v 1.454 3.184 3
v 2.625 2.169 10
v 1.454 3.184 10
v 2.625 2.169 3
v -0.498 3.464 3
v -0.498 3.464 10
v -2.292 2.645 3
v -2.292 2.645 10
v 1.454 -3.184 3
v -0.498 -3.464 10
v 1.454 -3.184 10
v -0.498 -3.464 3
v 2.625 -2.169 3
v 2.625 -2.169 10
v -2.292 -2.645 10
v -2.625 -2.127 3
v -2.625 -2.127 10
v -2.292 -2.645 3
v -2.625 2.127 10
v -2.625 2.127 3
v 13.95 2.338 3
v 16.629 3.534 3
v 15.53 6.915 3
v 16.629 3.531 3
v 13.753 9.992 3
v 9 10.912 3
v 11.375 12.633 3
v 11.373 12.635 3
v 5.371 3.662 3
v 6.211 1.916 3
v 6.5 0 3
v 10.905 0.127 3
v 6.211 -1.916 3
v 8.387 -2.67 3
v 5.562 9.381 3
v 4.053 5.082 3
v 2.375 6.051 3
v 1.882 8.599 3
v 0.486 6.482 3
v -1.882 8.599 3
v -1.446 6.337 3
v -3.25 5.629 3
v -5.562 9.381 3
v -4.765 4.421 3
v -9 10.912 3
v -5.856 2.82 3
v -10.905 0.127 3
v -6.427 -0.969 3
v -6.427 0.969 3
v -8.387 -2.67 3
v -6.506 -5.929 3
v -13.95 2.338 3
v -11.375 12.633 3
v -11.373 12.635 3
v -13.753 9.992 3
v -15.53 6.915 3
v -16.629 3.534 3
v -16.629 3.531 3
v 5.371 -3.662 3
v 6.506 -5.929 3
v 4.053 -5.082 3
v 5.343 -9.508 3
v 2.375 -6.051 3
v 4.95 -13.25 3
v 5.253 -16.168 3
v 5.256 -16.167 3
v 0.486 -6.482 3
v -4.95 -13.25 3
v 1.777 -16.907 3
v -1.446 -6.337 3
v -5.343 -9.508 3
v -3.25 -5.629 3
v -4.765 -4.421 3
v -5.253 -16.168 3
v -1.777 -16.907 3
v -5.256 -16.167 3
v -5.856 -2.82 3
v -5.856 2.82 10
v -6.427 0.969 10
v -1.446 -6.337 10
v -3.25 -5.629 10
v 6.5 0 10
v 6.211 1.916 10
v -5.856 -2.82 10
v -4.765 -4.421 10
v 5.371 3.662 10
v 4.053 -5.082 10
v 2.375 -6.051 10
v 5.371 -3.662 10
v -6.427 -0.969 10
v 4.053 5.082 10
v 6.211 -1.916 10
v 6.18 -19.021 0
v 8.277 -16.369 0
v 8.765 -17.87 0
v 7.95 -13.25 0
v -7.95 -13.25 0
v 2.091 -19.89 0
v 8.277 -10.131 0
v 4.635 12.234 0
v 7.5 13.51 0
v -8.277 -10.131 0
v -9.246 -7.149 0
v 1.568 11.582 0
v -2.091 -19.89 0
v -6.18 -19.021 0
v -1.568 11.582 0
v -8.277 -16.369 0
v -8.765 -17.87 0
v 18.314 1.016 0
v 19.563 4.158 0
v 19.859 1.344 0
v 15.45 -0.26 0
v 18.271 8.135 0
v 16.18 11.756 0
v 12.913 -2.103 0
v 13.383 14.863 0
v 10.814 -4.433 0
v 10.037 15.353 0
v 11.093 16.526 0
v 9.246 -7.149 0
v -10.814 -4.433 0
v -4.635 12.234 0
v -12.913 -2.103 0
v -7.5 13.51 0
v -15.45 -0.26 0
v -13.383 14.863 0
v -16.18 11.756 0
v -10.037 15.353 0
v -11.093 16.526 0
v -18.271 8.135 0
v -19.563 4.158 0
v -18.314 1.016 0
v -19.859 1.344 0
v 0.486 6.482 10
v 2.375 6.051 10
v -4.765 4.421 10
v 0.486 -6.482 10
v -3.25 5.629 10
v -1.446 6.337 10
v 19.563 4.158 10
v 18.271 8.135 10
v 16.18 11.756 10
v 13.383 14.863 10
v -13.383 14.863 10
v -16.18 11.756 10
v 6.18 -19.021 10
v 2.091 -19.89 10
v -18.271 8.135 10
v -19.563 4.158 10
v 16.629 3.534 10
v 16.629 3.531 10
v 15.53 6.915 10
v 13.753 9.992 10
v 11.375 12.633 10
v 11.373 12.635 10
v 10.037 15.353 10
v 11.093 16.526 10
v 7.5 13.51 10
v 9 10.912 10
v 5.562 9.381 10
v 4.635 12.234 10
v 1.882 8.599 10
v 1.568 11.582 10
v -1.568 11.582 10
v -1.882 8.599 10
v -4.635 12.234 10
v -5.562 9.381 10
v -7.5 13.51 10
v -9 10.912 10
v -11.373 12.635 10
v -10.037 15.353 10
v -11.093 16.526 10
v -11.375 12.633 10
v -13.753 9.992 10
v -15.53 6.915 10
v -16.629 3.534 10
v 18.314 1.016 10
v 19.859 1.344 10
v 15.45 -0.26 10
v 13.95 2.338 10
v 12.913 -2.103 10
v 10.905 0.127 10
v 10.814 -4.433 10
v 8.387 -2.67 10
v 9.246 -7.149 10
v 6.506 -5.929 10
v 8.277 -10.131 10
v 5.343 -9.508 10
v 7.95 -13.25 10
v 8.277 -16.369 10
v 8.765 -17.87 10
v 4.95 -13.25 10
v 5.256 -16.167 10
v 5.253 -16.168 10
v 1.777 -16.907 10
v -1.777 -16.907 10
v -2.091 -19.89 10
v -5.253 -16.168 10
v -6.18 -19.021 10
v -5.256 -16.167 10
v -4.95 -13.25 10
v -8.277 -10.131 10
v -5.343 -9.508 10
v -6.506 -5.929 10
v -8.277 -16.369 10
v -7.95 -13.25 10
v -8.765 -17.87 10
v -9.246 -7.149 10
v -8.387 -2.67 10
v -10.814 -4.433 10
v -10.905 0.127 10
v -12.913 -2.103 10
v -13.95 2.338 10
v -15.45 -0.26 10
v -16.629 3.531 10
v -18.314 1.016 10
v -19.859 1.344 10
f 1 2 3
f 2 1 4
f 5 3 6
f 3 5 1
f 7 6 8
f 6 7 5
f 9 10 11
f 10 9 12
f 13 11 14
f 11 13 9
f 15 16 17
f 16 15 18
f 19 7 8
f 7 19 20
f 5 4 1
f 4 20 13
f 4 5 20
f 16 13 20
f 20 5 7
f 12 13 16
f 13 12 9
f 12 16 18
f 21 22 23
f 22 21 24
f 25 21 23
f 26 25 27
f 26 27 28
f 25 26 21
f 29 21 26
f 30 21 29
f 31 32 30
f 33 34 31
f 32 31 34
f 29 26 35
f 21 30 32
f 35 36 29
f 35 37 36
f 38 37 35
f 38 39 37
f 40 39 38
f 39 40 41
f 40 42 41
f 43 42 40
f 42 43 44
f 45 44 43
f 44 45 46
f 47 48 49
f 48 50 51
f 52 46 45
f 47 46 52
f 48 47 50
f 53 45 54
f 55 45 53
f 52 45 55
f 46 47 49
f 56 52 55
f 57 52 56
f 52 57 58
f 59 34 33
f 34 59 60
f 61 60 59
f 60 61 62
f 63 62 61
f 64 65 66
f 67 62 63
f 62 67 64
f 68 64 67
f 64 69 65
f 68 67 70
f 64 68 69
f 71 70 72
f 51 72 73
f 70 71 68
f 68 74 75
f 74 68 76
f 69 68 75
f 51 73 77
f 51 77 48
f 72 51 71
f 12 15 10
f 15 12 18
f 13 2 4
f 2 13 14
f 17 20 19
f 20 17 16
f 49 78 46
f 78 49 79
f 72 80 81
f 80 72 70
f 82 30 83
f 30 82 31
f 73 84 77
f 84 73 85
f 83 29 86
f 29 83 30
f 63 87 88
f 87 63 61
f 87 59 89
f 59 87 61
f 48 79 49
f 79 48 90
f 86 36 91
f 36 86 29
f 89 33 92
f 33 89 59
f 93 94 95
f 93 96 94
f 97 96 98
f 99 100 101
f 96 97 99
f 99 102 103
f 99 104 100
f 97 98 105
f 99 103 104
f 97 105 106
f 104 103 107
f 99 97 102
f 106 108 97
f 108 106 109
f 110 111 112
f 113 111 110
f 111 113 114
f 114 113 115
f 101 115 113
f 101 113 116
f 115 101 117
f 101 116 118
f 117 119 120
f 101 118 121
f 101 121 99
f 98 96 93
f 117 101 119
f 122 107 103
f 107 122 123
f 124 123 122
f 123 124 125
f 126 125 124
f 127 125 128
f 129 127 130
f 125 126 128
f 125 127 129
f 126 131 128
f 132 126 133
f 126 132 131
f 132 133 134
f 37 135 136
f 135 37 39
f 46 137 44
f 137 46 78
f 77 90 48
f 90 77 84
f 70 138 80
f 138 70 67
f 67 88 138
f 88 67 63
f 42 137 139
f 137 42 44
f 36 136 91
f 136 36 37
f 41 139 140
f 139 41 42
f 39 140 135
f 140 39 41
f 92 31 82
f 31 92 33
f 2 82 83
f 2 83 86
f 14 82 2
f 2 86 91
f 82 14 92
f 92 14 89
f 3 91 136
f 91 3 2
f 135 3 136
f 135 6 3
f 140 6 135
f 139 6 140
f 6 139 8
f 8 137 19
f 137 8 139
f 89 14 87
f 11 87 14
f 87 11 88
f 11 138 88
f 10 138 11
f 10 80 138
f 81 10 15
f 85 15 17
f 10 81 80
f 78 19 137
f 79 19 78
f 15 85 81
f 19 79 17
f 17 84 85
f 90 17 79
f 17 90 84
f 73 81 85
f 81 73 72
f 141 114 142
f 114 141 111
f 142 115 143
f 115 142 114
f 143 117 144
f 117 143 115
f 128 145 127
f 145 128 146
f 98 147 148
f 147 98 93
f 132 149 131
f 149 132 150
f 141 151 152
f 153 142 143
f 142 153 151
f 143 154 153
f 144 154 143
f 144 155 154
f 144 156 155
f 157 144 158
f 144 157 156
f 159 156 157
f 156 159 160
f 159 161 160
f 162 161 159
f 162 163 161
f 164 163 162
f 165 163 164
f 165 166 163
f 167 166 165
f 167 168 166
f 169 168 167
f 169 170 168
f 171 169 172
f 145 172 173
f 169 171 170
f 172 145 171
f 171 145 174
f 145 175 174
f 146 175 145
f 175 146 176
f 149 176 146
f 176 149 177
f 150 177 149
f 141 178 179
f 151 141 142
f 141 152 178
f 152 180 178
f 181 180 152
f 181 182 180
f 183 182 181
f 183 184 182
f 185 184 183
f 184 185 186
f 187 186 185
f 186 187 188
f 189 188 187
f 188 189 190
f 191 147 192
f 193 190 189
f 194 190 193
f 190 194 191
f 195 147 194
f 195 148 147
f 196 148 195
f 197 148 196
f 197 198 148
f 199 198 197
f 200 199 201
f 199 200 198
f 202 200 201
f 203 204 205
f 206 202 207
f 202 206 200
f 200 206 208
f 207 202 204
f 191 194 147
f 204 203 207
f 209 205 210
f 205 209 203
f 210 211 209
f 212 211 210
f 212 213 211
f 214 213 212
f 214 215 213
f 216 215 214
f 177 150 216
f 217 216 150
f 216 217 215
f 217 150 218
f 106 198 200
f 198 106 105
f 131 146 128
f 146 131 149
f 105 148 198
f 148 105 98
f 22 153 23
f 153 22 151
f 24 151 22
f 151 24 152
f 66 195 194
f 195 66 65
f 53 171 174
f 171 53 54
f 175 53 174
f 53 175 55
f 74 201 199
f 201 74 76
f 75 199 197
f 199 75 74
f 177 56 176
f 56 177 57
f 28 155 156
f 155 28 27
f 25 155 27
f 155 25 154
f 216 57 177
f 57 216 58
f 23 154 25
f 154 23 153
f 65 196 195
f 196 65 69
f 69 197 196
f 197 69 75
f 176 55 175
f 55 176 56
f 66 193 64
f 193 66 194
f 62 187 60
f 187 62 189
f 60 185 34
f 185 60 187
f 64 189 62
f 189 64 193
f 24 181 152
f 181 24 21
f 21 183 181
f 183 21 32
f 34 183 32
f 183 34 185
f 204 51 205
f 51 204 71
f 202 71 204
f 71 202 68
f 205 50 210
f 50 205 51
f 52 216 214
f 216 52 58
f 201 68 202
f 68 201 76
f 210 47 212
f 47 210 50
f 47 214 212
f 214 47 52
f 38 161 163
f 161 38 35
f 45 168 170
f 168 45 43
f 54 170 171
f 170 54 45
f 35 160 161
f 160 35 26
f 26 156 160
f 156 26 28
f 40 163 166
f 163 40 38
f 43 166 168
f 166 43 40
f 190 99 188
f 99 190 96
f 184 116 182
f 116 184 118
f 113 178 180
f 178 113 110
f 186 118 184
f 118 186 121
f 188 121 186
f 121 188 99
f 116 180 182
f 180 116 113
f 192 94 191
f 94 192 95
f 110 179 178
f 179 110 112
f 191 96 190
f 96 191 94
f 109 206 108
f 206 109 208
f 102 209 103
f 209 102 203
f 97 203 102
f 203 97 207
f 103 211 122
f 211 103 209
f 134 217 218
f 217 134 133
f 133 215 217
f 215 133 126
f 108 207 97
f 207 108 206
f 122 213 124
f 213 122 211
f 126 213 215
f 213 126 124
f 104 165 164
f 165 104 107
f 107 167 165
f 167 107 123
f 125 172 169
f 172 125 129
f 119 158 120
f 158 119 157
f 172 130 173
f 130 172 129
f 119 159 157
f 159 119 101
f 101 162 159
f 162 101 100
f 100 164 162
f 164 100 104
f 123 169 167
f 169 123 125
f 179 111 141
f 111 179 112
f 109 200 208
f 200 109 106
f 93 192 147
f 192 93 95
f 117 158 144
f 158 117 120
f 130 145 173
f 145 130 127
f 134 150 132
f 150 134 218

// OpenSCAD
thickness=10;
outer_r=20;
knob_r=15;
bolt_r=3.5;
wall_thickness=3;
square_ratio=1.5;


union(){
	difference(){
		cylinder(r=bolt_r+wall_thickness,h=thickness);
		intersection(){
			translate([0,0,wall_thickness])cylinder(r=bolt_r,h=thickness);
			translate([-square_ratio*.5*bolt_r,-bolt_r*2,wall_thickness])cube([square_ratio*bolt_r,bolt_r*4,thickness]);
		}
	}
	intersection(){
		difference(){
			union(){
				difference(){
					cylinder(r=outer_r,h=thickness);
					translate([0,0,wall_thickness])cylinder(r=outer_r-wall_thickness,h=thickness);
					}
				translate([(outer_r+bolt_r+wall_thickness)*sin(120),(outer_r+bolt_r+wall_thickness)*cos(120),0])cylinder(r=knob_r+wall_thickness,h=thickness);
				translate([(outer_r+bolt_r+wall_thickness)*sin(240),(outer_r+bolt_r+wall_thickness)*cos(240),0])cylinder(r=knob_r+wall_thickness,h=thickness);
				translate([(outer_r+bolt_r+wall_thickness)*sin(360),(outer_r+bolt_r+wall_thickness)*cos(360),0])cylinder(r=knob_r+wall_thickness,h=thickness);
			}

			translate([(outer_r+bolt_r+wall_thickness)*sin(120),(outer_r+bolt_r+wall_thickness)*cos(120),-wall_thickness])cylinder(r=knob_r,h=thickness+wall_thickness*2);
			translate([(outer_r+bolt_r+wall_thickness)*sin(240),(outer_r+bolt_r+wall_thickness)*cos(240),-wall_thickness])cylinder(r=knob_r,h=thickness+wall_thickness*2);
			translate([(outer_r+bolt_r+wall_thickness)*sin(360),(outer_r+bolt_r+wall_thickness)*cos(360),-wall_thickness])cylinder(r=knob_r,h=thickness+wall_thickness*2);
		}
	cylinder(r=outer_r,h=thickness);
	}
}
